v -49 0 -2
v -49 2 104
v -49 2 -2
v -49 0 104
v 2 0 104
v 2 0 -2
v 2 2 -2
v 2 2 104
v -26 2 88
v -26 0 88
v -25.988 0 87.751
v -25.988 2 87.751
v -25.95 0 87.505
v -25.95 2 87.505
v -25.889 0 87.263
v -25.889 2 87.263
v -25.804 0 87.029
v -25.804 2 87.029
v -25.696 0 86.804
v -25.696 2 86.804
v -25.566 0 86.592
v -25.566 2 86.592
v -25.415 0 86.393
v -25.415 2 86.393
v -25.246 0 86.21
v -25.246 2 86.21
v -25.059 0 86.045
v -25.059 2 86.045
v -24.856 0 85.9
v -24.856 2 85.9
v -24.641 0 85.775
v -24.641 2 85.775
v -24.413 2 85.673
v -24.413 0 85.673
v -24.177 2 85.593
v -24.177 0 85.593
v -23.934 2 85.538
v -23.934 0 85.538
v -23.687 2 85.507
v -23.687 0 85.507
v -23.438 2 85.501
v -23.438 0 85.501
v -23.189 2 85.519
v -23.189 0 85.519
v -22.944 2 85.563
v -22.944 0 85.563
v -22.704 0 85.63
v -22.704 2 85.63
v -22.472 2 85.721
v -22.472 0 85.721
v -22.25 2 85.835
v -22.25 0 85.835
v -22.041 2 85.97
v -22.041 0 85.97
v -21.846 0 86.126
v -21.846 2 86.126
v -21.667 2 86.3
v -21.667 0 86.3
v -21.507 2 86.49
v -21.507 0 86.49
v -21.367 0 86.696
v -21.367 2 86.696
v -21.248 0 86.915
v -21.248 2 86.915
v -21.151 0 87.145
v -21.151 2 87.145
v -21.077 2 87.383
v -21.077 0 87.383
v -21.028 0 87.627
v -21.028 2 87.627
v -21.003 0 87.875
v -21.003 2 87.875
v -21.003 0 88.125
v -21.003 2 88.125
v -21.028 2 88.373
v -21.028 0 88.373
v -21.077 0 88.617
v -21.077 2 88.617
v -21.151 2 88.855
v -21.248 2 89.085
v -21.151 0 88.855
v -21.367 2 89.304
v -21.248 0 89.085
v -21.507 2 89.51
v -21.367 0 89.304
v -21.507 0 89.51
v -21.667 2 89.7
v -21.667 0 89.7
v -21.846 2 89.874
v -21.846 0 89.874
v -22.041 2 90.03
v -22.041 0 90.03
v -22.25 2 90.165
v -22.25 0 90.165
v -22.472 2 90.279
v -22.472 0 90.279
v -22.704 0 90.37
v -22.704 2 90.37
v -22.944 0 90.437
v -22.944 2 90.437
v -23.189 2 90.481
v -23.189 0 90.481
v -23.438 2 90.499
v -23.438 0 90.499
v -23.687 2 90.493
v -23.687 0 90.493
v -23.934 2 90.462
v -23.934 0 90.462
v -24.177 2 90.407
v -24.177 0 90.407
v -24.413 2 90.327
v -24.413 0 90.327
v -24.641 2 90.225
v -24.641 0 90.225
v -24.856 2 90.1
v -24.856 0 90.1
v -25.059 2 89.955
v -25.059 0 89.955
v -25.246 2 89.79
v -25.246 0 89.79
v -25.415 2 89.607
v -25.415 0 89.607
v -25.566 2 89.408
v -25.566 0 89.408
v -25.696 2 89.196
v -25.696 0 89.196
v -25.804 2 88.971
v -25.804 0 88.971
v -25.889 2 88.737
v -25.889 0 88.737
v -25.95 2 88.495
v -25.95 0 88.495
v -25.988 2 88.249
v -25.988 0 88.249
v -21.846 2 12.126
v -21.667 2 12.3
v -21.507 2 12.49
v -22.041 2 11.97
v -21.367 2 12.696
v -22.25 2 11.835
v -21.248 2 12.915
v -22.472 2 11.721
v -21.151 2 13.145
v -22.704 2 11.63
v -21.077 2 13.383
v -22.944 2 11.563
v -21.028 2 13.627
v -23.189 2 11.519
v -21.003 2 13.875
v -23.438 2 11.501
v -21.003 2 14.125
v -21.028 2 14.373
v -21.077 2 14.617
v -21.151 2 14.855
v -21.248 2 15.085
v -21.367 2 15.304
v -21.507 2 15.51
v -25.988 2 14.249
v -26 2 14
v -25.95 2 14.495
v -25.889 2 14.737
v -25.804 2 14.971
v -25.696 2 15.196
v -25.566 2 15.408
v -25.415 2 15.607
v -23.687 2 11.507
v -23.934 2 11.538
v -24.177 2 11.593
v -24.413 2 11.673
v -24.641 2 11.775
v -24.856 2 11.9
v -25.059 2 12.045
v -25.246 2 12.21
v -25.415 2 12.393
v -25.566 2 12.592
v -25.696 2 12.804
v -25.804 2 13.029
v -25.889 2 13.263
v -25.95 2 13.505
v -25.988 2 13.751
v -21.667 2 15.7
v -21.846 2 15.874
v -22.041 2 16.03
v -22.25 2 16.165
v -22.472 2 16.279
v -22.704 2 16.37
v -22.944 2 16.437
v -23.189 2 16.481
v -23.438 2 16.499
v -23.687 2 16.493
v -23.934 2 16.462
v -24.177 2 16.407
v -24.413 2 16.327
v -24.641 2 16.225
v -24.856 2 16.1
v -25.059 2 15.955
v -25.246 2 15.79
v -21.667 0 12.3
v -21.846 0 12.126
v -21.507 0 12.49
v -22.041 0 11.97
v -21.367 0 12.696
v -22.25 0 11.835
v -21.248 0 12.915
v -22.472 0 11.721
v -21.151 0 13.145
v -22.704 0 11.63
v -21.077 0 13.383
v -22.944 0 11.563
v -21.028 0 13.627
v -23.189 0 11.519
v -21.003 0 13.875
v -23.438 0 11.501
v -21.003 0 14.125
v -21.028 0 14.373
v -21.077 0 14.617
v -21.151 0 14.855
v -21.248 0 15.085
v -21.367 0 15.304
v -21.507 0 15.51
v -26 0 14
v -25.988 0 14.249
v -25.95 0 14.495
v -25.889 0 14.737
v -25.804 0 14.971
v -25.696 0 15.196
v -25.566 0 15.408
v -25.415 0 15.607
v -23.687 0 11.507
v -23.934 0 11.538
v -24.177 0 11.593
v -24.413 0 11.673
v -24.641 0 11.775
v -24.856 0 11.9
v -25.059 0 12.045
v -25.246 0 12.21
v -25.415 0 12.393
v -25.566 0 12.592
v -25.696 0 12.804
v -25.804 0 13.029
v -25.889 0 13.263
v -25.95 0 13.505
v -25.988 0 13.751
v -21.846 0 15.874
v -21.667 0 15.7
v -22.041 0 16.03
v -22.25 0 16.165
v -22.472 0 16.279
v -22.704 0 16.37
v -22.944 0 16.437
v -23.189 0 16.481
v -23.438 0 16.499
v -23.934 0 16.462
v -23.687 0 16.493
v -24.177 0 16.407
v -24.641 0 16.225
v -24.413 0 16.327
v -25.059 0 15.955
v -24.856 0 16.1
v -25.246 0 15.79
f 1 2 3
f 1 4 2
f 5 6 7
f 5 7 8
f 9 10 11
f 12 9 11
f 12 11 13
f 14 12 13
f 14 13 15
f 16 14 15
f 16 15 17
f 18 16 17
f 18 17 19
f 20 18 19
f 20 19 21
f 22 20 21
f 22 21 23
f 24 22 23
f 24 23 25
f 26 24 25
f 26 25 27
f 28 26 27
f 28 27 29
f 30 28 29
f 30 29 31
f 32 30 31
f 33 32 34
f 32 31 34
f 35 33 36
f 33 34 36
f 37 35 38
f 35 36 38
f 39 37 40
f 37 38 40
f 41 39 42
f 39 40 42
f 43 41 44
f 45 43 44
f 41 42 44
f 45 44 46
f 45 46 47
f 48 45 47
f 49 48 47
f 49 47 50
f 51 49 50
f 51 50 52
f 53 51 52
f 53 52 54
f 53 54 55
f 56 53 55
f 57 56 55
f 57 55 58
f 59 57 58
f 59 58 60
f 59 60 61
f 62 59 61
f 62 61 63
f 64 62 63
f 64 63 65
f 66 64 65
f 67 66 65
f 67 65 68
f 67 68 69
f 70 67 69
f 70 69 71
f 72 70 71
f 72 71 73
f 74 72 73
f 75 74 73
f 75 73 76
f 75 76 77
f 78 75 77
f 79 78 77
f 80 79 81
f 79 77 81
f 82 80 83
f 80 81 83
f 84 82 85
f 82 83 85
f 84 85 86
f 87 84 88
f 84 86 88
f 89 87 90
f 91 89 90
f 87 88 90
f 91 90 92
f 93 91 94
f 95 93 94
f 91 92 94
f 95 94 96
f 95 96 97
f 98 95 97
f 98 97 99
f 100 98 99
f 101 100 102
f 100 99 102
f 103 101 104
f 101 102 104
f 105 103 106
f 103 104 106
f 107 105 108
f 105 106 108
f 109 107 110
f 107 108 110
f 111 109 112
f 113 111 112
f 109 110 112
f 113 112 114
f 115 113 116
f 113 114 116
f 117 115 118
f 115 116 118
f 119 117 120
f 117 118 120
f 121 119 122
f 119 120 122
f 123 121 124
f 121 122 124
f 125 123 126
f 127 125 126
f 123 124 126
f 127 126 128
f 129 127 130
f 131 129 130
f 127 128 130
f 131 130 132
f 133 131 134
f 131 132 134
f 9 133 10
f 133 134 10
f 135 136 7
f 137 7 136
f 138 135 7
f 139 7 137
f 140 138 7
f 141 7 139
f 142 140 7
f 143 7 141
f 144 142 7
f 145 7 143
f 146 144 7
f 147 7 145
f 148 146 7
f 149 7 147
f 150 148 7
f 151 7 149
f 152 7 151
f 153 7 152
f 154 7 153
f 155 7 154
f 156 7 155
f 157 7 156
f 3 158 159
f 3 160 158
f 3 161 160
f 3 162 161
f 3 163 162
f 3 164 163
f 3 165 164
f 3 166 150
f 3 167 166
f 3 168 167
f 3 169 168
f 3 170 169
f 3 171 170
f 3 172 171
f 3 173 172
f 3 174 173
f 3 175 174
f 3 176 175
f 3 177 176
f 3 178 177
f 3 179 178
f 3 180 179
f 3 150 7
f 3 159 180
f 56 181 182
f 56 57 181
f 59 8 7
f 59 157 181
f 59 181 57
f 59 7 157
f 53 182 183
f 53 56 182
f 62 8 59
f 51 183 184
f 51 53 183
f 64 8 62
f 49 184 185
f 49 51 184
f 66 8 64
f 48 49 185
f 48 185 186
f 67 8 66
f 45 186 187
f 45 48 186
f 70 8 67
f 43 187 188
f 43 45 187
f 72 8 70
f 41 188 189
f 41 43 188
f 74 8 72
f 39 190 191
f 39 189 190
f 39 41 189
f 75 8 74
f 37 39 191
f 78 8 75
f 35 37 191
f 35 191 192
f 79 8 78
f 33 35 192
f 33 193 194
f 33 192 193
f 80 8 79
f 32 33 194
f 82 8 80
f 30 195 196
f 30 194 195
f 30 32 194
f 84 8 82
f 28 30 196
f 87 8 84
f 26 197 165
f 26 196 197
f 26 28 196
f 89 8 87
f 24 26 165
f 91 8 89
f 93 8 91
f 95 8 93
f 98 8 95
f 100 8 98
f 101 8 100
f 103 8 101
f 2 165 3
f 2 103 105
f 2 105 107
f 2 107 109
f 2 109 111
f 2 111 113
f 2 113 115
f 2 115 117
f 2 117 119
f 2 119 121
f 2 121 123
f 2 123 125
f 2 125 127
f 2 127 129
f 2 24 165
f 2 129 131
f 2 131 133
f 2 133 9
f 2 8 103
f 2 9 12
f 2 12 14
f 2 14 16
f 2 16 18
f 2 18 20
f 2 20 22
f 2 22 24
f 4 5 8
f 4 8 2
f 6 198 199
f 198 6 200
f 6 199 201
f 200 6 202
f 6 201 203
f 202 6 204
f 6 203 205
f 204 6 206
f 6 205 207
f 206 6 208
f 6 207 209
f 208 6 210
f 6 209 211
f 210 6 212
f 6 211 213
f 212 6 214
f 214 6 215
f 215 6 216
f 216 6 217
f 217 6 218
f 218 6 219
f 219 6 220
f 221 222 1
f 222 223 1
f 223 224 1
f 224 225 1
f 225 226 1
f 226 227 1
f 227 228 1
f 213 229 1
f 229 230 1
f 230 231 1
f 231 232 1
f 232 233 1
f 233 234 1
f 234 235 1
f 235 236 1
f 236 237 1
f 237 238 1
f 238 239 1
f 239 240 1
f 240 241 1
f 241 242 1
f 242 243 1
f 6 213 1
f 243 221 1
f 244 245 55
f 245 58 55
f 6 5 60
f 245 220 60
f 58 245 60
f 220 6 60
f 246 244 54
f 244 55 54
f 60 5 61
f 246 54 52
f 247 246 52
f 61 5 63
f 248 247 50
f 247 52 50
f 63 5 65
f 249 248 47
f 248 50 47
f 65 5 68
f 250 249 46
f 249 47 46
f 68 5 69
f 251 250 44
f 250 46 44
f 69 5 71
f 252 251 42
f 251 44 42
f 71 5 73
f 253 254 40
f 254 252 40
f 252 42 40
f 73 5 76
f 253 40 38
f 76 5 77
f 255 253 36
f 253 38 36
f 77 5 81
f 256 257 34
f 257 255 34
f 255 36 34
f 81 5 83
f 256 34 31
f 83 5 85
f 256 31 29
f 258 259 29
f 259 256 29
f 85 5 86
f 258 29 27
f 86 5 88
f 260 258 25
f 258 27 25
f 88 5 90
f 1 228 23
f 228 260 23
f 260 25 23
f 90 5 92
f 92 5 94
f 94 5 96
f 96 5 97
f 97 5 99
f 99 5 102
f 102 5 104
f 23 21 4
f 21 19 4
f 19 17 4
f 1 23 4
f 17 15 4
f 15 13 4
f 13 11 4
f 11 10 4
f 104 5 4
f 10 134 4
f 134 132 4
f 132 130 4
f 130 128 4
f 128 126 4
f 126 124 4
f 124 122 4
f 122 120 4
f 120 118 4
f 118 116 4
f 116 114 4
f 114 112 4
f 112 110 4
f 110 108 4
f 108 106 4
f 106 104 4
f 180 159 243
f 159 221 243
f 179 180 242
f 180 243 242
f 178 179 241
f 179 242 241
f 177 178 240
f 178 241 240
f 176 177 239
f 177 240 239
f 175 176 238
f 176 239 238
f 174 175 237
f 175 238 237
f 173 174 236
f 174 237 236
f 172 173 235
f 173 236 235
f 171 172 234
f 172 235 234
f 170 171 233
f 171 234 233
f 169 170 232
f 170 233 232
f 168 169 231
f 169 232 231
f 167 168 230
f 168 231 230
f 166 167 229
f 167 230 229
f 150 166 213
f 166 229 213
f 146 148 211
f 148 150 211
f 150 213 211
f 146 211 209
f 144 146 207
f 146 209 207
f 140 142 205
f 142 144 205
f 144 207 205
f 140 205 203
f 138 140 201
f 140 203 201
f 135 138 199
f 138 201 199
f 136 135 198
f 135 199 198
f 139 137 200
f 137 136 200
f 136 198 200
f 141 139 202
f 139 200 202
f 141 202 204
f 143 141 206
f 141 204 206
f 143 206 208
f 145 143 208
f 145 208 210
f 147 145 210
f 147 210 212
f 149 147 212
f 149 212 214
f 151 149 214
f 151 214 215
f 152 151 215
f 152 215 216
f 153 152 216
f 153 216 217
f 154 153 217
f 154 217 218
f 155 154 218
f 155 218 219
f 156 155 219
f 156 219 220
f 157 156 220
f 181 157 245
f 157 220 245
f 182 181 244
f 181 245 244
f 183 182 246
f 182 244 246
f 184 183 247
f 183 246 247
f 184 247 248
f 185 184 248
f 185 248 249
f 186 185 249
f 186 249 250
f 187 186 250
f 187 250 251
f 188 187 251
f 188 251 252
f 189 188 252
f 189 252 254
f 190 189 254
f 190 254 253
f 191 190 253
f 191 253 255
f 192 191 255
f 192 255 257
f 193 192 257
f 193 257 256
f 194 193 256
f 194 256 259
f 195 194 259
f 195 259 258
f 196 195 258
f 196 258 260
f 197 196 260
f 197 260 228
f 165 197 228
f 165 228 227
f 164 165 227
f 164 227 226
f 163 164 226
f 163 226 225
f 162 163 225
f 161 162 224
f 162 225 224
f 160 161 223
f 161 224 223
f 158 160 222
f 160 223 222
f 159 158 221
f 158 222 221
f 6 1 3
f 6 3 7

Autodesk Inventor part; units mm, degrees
ref_plane "YZ Plane" through (0, 0, 0) normal (1, 0, 0) x (0, 1, 0)
ref_plane "XZ Plane" through (0, 0, 0) normal (0, 1, 0) x (-1, 0, 0)
ref_plane "XY Plane" through (0, 0, 0) normal (0, 0, 1) x (1, 0, 0)
sketch "Sketch1" plane through (0, 0, 0) normal (0, 1, 0) x (-1, 0, 0)
  line L0 (0, 0) -> (47, 0)
  line L1 (47, 0) -> (47, 102)
  line L2 (47, 102) -> (0, 102)
  line L3 (0, 102) -> (0, 0)
  line L4 (47, 0) -> (49, 0)
  line L5 (49, 0) -> (49, -2)
  line L6 (49, -2) -> (47, -2)
  line L7 (47, -2) -> (47, 0)
  line L8 (47, 102) -> (49, 102)
  line L9 (49, 102) -> (49, 104)
  line L10 (49, 104) -> (47, 104)
  line L11 (47, 104) -> (47, 102)
  line L12 (0, 102) -> (-2, 102)
  line L13 (-2, 102) -> (-2, 104)
  line L14 (-2, 104) -> (0, 104)
  line L15 (0, 104) -> (0, 102)
  line L16 (0, 0) -> (-2, 0)
  line L17 (-2, 0) -> (-2, -2)
  line L18 (-2, -2) -> (0, -2)
  line L19 (0, -2) -> (0, 0)
  line L20 (47, -2) -> (0, -2)
  line L21 (-2, 0) -> (-2, 102)
  line L22 (0, 104) -> (47, 104)
  line L23 (49, 102) -> (49, 0)
  line L24 (23.5, 102) -> (23.5, 90.5)
  line L25 (23.5, 90.5) -> (23.5, 88)
  circle A0 centre (23.5, 88) radius 2.5
  line L26 (47, 51) -> (0, 51)
  circle A1 centre (23.5, 14) radius 2.5
  dimension "d14" = 47
  dimension "d15" = 102
  dimension "d16" = 2
  dimension "d17" = 2
  dimension "d18" = 2
  dimension "d19" = 2
  dimension "d20" = 2
  dimension "d21" = 2
  dimension "d22" = 2
  dimension "d23" = 2
  dimension "d28" = 11.5
  dimension "d29" = 2.5
sketch "Sketch2" plane through (0, 0, 0) normal (1, 0, 0) x (0, 1, 0)
  point P0 (0, 0)
extrude "Extrusion1" add sketch "Sketch1" along normal blind 2
sketch "Sketch3" plane through (2, 0, 104) normal (1, 0, 0) x (0, 0, -1)
  point P0 (104, 0)
sketch "Sketch4" plane through (2, 0, 104) normal (1, 0, 0) x (0, 0, -1)
  line L0 (106, 0) -> (0, 0) projected
  line L1 (0, 0) -> (2, 0)
  line L2 (2, 0) -> (2, 2)
  line L3 (2, 2) -> (0, 2)
  line L4 (0, 2) -> (0, 0)
  line L5 (2, 0) -> (104, 0)
  line L6 (104, 0) -> (104, -40)
  line L7 (104, -40) -> (2, -40)
  line L8 (2, -40) -> (2, 0)
  line L9 (2, -40) -> (0, -40)
  line L10 (0, -40) -> (0, -42)
  line L11 (0, -42) -> (2, -42)
  line L12 (2, -42) -> (2, -40)
  line L13 (104, -40) -> (106, -40)
  line L14 (106, -40) -> (106, -42)
  line L15 (106, -42) -> (104, -42)
  line L16 (104, -42) -> (104, -40)
  line L17 (104, 0) -> (106, 0)
  line L18 (106, 0) -> (106, 2)
  line L19 (106, 2) -> (104, 2)
  line L20 (104, 2) -> (104, 0)
  line L21 (0, 0) -> (0, -40)
  line L22 (2, -42) -> (104, -42)
  line L23 (106, -40) -> (106, 0)
  line L24 (2, 2) -> (104, 2)
  dimension "d33" = 2
  dimension "d34" = 2
  dimension "d35" = 102
  dimension "d36" = 40
  dimension "d37" = 2
  dimension "d38" = 2
  dimension "d39" = 2
  dimension "d40" = 2
  dimension "d41" = 2
  dimension "d42" = 2
sketch "Sketch5" plane through (0, 0, 0) normal (0, 0, 1) x (1, 0, 0)
  point P0 (0, 0)
equation "\"d14\" = largeur_ins"
equation "\"d15\" = longueur_ins"
equation "\"d16\" = epaisseur"
equation "\"d17\" = epaisseur"
equation "\"d18\" = epaisseur"
equation "\"d19\" = epaisseur"
equation "\"d20\" = epaisseur"
equation "\"d21\" = epaisseur"
equation "\"d22\" = epaisseur"
equation "\"d23\" = epaisseur"
equation "\"d31\" = epaisseur"
equation "\"d33\" = epaisseur"
equation "\"d34\" = epaisseur"
equation "\"d35\" = longueur_ins"
equation "\"d36\" = hauteur_inside"
equation "\"d37\" = epaisseur"
equation "\"d38\" = epaisseur"
equation "\"d39\" = epaisseur"
equation "\"d40\" = epaisseur"
equation "\"d41\" = epaisseur"
equation "\"d42\" = epaisseur"
equation "\"epaisseur\" = 2"
equation "\"largeur_ins\" = 47"
equation "\"longueur_ins\" = 102"
equation "\"dist_laser\" = 69"
equation "\"hauteur_inside\" = 40"
properties part number "boitier_laser"
